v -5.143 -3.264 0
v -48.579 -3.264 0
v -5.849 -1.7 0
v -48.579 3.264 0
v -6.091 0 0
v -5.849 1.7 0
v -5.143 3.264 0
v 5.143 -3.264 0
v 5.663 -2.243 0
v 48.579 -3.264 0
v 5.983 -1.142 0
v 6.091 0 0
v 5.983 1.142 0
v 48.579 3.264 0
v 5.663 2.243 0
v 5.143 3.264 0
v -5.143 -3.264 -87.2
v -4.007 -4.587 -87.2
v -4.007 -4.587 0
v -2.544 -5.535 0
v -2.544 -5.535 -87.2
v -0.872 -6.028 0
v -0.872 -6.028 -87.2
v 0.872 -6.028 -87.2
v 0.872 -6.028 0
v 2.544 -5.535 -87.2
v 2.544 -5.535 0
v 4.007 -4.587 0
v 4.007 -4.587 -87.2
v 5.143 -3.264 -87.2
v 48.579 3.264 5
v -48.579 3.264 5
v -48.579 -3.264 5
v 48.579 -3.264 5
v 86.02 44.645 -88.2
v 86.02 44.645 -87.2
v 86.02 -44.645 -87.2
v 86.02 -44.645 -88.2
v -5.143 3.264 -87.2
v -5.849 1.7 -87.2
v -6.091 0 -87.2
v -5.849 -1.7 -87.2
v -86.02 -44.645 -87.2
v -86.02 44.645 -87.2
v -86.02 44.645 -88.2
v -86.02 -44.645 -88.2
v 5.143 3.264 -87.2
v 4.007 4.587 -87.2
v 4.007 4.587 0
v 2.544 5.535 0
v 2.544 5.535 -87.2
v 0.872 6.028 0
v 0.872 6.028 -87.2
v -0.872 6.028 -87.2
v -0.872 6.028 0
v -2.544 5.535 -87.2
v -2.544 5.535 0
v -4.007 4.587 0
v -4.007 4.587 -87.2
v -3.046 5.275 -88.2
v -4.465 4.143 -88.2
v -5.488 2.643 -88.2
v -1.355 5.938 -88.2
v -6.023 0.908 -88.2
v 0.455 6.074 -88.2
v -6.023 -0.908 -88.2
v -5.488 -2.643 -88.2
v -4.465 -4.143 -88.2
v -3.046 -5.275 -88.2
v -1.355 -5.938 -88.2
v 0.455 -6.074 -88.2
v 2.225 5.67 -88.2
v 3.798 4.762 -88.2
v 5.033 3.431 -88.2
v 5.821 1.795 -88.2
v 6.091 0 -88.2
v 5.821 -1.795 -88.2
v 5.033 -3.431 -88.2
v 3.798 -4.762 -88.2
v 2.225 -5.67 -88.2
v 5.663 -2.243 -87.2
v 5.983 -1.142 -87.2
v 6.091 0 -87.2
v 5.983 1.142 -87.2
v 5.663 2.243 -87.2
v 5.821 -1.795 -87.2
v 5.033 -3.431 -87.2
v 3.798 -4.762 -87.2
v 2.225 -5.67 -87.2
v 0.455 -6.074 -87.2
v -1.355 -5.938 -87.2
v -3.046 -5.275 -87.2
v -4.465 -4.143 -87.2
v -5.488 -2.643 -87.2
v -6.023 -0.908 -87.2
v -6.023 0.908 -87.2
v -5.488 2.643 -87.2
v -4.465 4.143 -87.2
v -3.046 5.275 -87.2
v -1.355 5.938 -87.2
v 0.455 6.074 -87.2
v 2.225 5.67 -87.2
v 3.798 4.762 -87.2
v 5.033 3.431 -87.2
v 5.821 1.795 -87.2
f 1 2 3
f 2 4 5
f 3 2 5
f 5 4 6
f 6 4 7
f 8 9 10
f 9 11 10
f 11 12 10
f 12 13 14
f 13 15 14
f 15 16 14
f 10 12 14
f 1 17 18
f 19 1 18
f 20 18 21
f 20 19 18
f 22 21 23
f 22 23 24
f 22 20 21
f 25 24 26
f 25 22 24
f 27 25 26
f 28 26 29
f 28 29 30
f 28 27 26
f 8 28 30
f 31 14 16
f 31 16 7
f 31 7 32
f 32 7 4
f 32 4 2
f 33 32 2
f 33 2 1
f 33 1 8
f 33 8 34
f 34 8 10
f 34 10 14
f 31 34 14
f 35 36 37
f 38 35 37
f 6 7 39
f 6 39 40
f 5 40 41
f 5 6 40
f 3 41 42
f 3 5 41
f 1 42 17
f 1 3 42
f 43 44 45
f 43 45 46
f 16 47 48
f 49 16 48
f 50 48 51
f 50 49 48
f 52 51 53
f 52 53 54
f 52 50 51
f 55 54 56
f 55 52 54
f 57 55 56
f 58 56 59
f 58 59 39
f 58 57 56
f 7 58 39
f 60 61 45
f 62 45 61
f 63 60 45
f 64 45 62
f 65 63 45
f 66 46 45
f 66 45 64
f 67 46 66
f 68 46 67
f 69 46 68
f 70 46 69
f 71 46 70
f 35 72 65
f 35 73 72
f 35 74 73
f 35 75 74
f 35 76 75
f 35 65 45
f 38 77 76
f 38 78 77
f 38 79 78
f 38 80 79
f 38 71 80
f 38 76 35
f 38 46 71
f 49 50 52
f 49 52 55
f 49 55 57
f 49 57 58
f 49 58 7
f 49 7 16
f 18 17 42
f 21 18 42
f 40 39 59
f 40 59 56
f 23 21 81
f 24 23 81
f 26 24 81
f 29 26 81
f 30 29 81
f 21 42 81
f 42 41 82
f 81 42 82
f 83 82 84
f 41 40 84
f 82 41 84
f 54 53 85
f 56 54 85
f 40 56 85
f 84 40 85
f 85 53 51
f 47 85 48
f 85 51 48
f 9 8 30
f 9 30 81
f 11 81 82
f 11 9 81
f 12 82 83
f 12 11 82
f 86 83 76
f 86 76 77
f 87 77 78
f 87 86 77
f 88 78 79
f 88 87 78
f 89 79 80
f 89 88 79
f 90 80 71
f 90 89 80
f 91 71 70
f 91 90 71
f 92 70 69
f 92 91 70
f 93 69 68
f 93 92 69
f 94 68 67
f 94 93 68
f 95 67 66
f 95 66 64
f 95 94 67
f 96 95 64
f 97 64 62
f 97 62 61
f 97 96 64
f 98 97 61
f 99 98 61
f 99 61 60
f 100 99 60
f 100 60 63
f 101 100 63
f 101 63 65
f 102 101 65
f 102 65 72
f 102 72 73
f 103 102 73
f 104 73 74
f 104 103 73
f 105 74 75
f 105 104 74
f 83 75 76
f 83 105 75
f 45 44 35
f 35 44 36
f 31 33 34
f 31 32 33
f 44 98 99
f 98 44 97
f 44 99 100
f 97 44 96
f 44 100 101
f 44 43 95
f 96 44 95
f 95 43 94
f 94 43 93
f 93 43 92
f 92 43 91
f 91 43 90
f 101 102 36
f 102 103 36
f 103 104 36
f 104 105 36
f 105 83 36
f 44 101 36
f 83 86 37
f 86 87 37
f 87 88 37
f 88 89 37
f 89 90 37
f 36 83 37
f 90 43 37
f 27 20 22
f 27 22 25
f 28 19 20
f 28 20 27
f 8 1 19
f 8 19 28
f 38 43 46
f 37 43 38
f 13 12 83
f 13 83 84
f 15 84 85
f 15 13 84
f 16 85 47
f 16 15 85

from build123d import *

# Parameters (mm, degrees)
F1_DEPTH = 5
F2_DEPTH = 87.2
F3_W     = 172.0396727324
F3_H     = 89.2892256379
F3_R     = 6.0911774304
F4_DEPTH = 1


with BuildPart() as f1:
    # F0 (on Top) → F1 (new body)
    with BuildSketch(Plane.XY):
        with BuildLine():
            Line((-48.5793091357, -3.2642639708), (-5.1426669363, -3.2642639708))
            ThreePointArc((-5.1426669363, -3.2642639708), (-6.0911774304, 0), (-5.1426669363, 3.2642639708))
            Line((-5.1426669363, 3.2642639708), (-48.5793091357, 3.2642639708))
            Line((-48.5793091357, 3.2642639708), (-48.5793091357, -3.2642639708))
        make_face()
        with BuildLine():
            Line((-5.1426669363, -3.2642639708), (5.1426669363, -3.2642639708))
            ThreePointArc((5.1426669363, -3.2642639708), (5.8492452189, -1.6996390373), (6.0911774304, 0))
            ThreePointArc((6.0911774304, 0), (5.8492452189, 1.6996390373), (5.1426669363, 3.2642639708))
            Line((5.1426669363, 3.2642639708), (-5.1426669363, 3.2642639708))
            ThreePointArc((-5.1426669363, 3.2642639708), (-6.0911774304, 0), (-5.1426669363, -3.2642639708))
        make_face()
        with BuildLine():
            Line((5.1426669363, -3.2642639708), (48.5793091357, -3.2642639708))
            Line((48.5793091357, -3.2642639708), (48.5793091357, 3.2642639708))
            Line((48.5793091357, 3.2642639708), (5.1426669363, 3.2642639708))
            ThreePointArc((5.1426669363, 3.2642639708), (5.8492452189, 1.6996390373), (6.0911774304, 0))
            ThreePointArc((6.0911774304, 0), (5.8492452189, -1.6996390373), (5.1426669363, -3.2642639708))
        make_face()
    extrude(amount=F1_DEPTH)

    # F0 (on Top) → F2 (join)
    with BuildSketch(Plane.XY):
        with BuildLine():
            ThreePointArc((-5.1426669363, -3.2642639708), (0, -6.0911774304), (5.1426669363, -3.2642639708))
            Line((5.1426669363, -3.2642639708), (-5.1426669363, -3.2642639708))
        make_face()
        with BuildLine():
            Line((-5.1426669363, 3.2642639708), (5.1426669363, 3.2642639708))
            ThreePointArc((5.1426669363, 3.2642639708), (0, 6.0911774304), (-5.1426669363, 3.2642639708))
        make_face()
        with BuildLine():
            Line((-5.1426669363, -3.2642639708), (5.1426669363, -3.2642639708))
            ThreePointArc((5.1426669363, -3.2642639708), (5.8492452189, -1.6996390373), (6.0911774304, 0))
            ThreePointArc((6.0911774304, 0), (5.8492452189, 1.6996390373), (5.1426669363, 3.2642639708))
            Line((5.1426669363, 3.2642639708), (-5.1426669363, 3.2642639708))
            ThreePointArc((-5.1426669363, 3.2642639708), (-6.0911774304, 0), (-5.1426669363, -3.2642639708))
        make_face()
    extrude(amount=-F2_DEPTH)


with BuildPart() as f4:
    # F3 (on face) → F4 (new body)
    with BuildSketch(Plane(origin=(0, 0, -87.2), x_dir=(1, 0, 0), z_dir=(0, 0, -1))):
        Rectangle(F3_W, F3_H)
        Circle(F3_R, mode=Mode.SUBTRACT)
    extrude(amount=F4_DEPTH)


solid = Compound([f1.part, f4.part])
